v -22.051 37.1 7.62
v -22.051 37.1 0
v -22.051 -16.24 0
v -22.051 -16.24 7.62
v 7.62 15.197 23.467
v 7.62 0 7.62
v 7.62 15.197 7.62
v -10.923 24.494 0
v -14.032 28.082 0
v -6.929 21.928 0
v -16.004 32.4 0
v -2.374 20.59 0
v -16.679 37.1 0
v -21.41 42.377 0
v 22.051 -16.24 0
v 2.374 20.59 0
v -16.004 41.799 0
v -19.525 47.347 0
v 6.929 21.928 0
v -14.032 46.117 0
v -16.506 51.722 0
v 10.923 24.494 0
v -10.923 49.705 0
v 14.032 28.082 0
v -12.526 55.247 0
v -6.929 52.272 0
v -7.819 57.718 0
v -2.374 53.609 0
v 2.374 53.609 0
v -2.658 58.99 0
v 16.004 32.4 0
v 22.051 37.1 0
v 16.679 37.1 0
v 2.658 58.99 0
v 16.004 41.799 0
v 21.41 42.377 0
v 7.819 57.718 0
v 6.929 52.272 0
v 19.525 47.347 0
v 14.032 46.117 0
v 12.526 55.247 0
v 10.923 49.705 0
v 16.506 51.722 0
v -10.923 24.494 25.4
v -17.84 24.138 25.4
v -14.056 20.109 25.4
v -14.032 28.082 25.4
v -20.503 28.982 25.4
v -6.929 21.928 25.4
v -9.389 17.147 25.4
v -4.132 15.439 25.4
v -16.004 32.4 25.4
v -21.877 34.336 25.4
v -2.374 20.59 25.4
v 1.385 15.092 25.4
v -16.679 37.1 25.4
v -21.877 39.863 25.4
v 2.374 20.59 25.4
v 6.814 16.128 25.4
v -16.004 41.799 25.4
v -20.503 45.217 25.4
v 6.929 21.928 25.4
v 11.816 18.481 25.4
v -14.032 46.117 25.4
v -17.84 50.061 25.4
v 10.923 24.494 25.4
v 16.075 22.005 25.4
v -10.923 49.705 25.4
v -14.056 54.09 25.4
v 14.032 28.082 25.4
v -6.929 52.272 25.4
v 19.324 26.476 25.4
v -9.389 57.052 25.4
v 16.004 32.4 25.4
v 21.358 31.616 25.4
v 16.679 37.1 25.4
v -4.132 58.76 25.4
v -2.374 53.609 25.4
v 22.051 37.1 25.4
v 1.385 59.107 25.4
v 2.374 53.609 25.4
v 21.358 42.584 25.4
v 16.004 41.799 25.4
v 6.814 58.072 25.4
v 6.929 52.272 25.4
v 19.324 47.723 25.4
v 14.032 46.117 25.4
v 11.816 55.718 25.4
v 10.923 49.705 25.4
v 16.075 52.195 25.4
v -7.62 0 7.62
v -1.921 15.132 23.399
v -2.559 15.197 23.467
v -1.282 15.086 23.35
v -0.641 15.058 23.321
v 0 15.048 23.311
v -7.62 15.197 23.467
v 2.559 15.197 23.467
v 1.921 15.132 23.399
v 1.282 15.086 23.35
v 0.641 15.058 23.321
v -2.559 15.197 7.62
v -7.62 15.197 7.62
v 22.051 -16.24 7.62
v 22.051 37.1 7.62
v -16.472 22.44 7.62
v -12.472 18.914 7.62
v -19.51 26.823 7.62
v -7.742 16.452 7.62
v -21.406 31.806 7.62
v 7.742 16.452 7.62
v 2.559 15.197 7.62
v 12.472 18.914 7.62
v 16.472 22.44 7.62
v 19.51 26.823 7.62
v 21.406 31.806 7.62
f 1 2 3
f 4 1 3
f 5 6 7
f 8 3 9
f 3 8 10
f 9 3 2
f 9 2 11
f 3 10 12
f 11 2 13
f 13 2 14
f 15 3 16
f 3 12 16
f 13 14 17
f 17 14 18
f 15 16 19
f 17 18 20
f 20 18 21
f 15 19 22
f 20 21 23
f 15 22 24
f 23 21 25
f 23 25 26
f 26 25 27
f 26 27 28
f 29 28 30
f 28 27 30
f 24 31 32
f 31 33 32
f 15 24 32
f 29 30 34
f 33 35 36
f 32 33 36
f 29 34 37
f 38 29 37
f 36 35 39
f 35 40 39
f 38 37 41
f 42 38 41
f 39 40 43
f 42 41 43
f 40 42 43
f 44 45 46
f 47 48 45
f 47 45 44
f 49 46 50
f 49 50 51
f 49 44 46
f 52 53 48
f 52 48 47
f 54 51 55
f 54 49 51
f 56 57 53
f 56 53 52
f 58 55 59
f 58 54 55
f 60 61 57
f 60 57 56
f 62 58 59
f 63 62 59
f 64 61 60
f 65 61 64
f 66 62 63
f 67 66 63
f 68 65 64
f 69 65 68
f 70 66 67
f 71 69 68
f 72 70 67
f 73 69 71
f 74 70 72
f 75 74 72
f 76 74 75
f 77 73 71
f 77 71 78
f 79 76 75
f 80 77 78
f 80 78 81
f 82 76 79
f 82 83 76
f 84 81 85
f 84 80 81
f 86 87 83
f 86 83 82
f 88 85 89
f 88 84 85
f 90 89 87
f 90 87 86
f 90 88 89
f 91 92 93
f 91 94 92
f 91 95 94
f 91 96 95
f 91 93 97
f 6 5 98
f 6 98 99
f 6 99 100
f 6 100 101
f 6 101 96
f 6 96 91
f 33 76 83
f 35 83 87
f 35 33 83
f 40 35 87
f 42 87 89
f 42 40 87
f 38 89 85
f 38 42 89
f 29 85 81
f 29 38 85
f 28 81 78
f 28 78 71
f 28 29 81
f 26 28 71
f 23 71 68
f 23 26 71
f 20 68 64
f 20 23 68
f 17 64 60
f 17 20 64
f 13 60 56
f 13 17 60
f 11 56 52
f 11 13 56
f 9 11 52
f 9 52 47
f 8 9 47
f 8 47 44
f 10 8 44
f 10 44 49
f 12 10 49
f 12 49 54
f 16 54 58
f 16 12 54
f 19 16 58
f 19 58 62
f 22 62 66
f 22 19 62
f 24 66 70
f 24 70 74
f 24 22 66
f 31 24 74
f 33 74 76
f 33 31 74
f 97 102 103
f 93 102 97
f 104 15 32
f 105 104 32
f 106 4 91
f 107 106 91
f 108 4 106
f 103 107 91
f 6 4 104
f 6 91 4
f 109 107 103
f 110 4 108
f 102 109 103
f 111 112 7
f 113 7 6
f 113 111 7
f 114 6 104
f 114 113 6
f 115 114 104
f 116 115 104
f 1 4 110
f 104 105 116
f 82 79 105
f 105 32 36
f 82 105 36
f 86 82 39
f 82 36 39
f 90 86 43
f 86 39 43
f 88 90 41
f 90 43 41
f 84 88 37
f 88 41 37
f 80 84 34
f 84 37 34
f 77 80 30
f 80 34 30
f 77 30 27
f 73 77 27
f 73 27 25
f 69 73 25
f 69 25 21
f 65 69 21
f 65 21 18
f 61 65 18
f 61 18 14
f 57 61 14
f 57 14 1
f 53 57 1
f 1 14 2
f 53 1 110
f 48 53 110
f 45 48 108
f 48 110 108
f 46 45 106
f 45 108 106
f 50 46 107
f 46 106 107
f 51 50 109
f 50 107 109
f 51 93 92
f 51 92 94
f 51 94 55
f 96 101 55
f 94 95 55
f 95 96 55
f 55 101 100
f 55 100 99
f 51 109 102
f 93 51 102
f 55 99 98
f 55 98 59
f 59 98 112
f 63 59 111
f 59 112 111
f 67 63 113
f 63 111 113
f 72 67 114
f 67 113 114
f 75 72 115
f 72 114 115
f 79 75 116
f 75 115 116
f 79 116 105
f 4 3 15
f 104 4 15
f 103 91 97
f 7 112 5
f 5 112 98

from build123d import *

# Parameters (mm, degrees)
F1_DEPTH      = 7.62
F0_R          = 16.67939
F2_DEPTH      = 25.4
F4_DEPTH      = 7.62
F4_DEPTH_BACK = 7.62


with BuildPart() as f1:
    # F0 (on Top) → F1 (new body)
    with BuildSketch(Plane.XY):
        with BuildLine():
            Line((22.05117, -16.240392), (22.05117, 37.099611))
            ThreePointArc((22.05117, 37.099611), (0, 15.048441), (-22.05117, 37.099611))
            Line((-22.05117, 37.099611), (-22.05117, -16.240392))
            Line((-22.05117, -16.240392), (22.05117, -16.240392))
        make_face()
    extrude(amount=F1_DEPTH)

    # F0 (on Top) → F2 (join)
    with BuildSketch(Plane.XY):
        with BuildLine():
            ThreePointArc((-22.05117, 37.099611), (0, 15.048441), (22.05117, 37.099611))
            ThreePointArc((22.05117, 37.099611), (0, 59.150781), (-22.05117, 37.099611))
        make_face()
        with Locations((0, 37.099611)):
            Circle(F0_R, mode=Mode.SUBTRACT)
    extrude(amount=F2_DEPTH)

    # F3 (on Right) → F4 (join, two sides)
    with BuildSketch(Plane.YZ) as f4_sk:
        Polygon((15.197432, 23.466621), (0, 7.62), (15.197432, 7.62), align=None)
    extrude(amount=F4_DEPTH)
    extrude(f4_sk.sketch, amount=-F4_DEPTH_BACK)


solid = f1.part
